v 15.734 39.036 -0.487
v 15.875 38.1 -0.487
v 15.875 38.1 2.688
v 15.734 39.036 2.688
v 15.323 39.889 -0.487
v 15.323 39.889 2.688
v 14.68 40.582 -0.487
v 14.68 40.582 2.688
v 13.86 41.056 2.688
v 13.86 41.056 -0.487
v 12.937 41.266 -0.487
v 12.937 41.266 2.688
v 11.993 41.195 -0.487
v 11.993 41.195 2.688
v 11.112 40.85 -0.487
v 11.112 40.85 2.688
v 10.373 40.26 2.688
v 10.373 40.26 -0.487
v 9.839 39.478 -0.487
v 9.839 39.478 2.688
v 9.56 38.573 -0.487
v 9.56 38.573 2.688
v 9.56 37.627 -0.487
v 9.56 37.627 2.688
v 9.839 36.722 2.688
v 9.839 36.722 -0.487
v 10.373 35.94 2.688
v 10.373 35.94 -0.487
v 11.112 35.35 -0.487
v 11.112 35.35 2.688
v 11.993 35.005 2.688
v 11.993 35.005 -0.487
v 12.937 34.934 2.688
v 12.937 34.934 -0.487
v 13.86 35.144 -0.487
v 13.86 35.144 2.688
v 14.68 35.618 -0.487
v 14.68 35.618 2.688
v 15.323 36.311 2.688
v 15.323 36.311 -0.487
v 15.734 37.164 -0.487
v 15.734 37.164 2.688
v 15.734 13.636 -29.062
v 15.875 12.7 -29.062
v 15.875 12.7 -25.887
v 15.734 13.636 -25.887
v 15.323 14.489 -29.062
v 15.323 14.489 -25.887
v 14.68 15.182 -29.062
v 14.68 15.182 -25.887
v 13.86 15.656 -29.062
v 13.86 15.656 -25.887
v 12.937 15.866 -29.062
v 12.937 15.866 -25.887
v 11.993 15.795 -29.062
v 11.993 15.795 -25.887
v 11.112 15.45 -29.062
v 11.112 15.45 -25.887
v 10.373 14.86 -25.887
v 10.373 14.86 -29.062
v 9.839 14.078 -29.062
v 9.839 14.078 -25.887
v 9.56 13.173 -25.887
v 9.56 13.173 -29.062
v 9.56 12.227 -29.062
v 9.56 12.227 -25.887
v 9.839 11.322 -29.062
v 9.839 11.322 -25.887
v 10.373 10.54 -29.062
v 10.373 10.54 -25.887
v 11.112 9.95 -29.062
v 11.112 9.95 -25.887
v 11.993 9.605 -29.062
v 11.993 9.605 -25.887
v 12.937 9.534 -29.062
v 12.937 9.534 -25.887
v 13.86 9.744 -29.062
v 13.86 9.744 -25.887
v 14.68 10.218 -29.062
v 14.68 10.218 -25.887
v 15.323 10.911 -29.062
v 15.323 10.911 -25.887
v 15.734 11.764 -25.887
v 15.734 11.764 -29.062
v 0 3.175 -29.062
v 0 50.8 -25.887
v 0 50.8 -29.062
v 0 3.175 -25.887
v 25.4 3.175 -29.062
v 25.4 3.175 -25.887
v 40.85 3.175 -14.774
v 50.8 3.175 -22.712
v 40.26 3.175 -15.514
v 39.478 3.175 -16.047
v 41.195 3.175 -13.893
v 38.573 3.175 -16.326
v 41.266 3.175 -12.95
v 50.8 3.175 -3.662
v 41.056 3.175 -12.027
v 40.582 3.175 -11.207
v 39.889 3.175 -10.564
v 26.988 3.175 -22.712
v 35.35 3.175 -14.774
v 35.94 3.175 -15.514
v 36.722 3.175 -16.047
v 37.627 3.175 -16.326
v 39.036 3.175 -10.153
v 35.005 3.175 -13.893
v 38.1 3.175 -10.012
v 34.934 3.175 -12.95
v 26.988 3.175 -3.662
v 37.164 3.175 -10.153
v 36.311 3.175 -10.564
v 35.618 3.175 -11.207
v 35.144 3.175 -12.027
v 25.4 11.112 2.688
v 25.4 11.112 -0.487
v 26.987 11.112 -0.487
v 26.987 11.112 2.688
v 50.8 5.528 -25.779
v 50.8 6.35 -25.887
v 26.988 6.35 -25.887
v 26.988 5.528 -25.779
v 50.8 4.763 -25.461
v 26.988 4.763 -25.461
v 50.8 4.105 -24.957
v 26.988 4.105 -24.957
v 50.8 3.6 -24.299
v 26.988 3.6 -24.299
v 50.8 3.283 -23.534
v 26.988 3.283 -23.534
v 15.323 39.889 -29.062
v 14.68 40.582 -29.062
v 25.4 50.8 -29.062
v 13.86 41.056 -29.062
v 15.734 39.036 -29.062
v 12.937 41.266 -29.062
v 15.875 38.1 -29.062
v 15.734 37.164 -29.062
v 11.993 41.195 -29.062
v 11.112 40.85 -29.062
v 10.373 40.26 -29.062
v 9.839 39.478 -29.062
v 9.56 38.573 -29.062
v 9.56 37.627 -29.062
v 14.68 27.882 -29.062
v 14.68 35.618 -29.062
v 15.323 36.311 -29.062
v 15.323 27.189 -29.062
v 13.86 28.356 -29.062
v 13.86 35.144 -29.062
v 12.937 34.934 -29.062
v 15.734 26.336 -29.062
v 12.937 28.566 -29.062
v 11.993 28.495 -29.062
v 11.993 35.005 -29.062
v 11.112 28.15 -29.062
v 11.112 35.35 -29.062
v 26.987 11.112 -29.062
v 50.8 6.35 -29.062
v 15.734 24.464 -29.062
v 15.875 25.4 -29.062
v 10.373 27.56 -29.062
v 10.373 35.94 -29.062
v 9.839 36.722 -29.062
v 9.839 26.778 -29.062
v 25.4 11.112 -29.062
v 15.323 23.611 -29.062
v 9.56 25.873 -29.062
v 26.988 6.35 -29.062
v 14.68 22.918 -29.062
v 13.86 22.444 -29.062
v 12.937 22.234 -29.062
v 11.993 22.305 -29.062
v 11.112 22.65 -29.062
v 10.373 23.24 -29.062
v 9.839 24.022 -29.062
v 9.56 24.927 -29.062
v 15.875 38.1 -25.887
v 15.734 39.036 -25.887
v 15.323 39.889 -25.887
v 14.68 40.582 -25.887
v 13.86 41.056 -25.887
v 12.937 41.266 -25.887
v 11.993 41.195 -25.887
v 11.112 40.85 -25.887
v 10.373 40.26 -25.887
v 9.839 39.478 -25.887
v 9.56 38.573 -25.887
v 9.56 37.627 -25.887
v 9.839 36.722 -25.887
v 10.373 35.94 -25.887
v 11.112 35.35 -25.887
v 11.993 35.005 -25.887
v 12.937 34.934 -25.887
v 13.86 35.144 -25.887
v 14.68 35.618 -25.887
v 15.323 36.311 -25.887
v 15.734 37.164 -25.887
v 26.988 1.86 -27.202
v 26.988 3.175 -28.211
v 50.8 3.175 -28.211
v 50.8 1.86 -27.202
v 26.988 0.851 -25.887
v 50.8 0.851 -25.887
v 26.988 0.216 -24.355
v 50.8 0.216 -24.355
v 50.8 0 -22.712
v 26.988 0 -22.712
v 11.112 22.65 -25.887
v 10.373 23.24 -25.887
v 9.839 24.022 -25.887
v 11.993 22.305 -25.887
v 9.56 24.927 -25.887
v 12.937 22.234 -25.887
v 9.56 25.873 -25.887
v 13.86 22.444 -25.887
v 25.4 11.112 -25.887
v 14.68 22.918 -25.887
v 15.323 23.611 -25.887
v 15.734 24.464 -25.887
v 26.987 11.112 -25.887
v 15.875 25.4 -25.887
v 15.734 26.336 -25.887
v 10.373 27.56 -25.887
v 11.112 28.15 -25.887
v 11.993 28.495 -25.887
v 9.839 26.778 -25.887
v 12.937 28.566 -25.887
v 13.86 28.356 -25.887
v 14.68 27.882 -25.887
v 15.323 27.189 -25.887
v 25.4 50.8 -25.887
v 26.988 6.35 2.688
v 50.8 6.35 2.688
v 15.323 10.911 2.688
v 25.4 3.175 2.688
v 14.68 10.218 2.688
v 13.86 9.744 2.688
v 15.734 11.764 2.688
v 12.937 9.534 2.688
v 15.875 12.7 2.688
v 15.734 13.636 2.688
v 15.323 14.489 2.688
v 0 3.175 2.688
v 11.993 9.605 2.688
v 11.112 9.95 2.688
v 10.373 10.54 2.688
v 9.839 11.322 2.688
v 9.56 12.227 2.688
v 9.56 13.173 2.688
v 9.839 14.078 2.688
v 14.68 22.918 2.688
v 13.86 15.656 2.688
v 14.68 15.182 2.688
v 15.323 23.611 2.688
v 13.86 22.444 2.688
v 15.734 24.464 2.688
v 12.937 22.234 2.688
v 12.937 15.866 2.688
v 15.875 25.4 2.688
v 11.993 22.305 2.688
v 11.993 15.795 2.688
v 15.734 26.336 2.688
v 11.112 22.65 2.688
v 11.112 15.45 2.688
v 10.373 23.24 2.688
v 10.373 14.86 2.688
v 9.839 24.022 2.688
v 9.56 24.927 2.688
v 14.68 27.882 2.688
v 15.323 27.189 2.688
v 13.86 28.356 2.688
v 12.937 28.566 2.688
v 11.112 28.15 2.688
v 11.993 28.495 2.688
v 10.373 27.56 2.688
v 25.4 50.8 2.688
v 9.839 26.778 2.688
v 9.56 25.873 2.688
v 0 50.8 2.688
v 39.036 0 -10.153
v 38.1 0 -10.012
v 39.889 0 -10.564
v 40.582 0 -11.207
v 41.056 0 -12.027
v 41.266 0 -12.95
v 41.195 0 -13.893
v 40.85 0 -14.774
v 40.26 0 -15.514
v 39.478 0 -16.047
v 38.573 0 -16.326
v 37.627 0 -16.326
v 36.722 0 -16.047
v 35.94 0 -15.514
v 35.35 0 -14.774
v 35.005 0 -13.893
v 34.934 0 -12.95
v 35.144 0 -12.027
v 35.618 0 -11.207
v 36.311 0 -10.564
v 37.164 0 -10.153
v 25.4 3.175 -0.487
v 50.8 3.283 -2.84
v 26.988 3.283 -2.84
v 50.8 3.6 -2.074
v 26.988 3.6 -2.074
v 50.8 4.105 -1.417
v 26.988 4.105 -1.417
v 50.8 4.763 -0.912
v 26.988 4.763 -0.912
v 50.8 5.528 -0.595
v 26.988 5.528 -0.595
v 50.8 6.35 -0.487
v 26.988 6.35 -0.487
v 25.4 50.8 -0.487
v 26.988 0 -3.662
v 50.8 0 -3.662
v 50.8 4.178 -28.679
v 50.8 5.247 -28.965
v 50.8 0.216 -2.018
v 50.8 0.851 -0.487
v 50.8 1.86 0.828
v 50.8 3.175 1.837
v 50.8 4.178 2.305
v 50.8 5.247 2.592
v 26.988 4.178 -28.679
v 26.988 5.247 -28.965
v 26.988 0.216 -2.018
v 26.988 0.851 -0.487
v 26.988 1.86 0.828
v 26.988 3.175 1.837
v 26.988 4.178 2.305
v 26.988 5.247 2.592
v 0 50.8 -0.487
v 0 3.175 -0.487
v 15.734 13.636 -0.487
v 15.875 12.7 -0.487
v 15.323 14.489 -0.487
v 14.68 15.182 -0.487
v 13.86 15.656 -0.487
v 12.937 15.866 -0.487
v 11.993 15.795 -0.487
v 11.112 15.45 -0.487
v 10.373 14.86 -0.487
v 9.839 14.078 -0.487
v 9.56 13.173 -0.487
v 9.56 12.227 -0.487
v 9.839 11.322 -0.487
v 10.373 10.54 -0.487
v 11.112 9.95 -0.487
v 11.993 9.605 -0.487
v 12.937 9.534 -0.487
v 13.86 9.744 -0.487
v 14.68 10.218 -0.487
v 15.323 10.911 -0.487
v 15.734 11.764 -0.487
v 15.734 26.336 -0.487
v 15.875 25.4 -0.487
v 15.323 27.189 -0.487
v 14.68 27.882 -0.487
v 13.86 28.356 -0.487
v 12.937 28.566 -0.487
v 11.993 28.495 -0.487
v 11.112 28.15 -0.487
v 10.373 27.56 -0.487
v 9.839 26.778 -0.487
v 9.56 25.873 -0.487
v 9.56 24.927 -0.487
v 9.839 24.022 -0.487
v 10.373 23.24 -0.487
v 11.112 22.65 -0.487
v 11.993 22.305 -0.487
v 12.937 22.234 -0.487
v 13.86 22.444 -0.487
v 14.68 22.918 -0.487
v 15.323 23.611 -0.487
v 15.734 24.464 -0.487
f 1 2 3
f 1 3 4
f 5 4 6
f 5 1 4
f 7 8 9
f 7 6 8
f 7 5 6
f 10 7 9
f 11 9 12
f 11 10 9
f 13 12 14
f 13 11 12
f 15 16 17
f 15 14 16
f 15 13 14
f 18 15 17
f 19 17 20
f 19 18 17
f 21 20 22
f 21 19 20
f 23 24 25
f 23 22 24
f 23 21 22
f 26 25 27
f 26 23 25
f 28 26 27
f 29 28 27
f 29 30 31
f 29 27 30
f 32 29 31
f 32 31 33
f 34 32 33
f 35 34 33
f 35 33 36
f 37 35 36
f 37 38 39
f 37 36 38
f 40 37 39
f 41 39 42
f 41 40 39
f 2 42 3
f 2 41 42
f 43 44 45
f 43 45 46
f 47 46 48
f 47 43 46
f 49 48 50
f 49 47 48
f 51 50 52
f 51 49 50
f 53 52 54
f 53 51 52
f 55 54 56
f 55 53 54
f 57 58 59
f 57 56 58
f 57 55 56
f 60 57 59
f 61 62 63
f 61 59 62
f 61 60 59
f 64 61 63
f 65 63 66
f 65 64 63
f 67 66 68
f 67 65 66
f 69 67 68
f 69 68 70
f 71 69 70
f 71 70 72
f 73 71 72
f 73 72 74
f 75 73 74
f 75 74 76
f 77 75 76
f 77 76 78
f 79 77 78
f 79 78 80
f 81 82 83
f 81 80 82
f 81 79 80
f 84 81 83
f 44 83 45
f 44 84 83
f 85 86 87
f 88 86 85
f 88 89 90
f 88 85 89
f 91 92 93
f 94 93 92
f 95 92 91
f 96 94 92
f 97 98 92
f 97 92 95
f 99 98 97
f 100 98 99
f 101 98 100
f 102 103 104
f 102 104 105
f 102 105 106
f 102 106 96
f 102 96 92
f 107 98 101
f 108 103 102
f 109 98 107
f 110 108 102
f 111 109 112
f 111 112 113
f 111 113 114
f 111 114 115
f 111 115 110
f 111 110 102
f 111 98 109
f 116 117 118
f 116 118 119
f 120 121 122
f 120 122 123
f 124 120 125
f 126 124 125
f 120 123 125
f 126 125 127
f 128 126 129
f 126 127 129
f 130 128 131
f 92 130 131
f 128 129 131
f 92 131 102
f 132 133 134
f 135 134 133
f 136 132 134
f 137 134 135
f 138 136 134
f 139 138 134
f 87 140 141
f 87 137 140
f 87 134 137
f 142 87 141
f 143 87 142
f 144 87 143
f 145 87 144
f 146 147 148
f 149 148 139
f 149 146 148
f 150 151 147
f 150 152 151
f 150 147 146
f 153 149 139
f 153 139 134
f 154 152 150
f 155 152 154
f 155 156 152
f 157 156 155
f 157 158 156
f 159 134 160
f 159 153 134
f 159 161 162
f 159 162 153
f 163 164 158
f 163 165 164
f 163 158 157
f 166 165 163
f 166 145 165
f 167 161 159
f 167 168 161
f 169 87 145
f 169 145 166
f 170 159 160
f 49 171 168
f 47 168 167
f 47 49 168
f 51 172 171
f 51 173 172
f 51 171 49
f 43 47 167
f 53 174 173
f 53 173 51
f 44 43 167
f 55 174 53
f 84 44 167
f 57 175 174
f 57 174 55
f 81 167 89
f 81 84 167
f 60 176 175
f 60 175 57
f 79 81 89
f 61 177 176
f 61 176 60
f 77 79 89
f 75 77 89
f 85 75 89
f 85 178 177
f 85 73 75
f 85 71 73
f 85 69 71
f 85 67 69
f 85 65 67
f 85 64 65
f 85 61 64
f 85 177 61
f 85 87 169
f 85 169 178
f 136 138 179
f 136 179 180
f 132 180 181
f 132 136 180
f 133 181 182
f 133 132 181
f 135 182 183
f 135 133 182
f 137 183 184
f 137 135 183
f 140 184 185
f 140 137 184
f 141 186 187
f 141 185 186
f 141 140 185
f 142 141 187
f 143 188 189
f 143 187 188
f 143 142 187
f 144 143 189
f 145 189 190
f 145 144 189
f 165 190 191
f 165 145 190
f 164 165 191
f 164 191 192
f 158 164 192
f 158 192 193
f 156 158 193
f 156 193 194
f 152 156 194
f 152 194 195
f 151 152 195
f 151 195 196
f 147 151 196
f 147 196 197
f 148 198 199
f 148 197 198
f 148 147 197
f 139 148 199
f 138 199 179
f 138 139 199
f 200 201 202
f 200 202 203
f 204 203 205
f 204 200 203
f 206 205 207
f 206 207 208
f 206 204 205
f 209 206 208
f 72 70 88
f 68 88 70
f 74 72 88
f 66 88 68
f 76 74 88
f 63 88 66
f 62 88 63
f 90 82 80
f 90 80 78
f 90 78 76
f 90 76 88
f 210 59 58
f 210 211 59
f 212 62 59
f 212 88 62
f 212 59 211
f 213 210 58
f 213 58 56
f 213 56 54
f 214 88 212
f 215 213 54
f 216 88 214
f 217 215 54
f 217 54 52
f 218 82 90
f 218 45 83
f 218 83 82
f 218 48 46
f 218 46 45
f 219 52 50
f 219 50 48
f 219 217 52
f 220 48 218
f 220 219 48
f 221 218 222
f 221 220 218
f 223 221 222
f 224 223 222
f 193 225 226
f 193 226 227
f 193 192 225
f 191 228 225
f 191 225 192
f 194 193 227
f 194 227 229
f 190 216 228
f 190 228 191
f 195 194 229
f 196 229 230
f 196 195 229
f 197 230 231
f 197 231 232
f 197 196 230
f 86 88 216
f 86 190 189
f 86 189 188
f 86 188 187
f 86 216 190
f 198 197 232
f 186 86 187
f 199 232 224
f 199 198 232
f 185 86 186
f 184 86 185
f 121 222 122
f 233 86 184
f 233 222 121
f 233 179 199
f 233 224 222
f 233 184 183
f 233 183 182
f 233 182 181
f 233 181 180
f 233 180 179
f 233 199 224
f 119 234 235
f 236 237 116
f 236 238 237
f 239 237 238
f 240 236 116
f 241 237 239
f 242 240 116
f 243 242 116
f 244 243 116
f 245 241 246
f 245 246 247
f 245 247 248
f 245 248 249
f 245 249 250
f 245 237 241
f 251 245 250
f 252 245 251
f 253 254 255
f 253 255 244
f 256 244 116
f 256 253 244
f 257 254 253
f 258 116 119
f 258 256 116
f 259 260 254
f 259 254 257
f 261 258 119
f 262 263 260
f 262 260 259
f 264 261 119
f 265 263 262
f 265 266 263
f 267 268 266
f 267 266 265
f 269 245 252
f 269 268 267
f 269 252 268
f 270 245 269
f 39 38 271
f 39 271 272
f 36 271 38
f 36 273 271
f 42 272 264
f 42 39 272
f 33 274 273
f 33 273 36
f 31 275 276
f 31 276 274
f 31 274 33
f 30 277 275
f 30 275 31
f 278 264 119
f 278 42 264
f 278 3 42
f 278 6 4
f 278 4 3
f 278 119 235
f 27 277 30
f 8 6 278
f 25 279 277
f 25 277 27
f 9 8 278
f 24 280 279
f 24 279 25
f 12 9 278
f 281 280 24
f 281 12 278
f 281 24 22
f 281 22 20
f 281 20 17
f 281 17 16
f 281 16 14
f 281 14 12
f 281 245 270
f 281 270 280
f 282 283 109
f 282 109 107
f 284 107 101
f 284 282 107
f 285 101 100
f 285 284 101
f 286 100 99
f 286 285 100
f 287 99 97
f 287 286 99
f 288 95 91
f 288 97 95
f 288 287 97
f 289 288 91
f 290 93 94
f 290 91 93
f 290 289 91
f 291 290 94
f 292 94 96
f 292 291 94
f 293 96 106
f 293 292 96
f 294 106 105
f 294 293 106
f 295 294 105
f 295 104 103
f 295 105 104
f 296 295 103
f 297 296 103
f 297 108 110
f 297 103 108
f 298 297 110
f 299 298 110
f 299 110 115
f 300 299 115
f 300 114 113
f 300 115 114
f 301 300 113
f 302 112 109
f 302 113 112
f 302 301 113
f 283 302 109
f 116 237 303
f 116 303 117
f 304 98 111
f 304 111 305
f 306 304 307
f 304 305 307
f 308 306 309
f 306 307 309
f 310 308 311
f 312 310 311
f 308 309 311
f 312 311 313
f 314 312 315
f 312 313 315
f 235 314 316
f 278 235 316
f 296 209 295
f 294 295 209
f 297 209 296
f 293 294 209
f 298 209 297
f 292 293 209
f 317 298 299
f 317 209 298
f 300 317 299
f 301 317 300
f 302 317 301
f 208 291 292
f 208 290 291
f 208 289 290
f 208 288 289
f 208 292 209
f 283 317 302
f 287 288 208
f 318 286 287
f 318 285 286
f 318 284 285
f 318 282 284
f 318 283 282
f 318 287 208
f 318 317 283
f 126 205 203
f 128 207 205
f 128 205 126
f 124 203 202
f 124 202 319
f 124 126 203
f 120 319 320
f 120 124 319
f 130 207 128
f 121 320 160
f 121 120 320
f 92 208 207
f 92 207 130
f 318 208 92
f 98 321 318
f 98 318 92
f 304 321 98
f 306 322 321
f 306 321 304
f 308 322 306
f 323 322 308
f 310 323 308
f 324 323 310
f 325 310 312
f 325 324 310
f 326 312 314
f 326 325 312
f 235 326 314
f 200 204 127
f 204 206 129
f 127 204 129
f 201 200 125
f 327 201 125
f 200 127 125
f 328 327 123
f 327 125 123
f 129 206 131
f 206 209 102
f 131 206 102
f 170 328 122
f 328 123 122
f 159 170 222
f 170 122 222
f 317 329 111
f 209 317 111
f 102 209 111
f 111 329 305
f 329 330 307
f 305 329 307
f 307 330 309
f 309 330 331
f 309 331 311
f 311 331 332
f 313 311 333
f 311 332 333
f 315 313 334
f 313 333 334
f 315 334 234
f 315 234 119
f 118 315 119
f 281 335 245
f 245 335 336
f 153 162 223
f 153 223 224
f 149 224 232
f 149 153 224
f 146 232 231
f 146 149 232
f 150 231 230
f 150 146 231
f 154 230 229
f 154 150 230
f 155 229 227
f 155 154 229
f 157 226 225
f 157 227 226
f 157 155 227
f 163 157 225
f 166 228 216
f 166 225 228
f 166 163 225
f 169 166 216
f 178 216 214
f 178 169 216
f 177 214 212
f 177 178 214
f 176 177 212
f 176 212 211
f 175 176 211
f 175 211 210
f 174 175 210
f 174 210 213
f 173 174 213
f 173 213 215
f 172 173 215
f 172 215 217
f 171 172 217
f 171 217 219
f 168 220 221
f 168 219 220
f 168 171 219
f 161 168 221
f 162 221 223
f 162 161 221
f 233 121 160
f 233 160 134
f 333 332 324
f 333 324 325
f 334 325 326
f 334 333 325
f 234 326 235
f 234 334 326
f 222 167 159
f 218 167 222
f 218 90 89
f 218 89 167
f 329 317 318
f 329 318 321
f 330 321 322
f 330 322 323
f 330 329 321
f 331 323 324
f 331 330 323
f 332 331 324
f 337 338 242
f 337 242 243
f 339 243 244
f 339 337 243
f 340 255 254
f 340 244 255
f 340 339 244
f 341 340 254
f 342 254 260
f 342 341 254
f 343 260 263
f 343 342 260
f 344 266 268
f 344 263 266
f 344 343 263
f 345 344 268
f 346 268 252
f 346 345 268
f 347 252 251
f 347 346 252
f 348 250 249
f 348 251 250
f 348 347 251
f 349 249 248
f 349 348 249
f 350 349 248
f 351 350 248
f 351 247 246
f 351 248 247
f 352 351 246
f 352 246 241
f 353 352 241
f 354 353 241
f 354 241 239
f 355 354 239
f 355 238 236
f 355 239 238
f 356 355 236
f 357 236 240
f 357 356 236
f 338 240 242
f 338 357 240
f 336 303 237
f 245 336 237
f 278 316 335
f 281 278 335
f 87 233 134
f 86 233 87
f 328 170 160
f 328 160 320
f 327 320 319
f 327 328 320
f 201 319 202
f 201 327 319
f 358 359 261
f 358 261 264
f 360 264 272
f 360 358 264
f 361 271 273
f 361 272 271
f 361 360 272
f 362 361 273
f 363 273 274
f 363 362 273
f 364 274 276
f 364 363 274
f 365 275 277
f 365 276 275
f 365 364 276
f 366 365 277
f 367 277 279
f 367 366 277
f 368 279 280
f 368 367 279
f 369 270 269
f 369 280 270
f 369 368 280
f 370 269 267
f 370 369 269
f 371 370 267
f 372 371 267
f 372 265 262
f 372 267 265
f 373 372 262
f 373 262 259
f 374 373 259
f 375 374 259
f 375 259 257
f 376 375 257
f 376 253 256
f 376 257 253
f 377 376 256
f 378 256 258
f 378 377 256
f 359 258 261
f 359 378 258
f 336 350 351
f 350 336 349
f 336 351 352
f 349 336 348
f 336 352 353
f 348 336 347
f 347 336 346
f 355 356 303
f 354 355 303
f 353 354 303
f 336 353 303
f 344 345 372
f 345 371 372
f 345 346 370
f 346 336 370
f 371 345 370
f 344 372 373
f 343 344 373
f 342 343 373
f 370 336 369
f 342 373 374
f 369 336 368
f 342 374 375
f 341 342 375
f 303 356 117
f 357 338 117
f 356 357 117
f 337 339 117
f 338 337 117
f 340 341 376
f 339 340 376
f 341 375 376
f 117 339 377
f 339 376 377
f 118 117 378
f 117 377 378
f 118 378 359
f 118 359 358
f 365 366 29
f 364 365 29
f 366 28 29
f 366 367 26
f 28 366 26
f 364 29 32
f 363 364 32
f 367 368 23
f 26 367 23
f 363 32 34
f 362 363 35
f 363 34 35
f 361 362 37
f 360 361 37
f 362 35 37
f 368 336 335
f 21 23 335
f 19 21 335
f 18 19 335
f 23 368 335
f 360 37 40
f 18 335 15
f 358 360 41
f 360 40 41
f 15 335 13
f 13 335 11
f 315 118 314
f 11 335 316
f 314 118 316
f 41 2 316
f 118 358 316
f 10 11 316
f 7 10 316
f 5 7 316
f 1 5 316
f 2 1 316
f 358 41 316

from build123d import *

# Parameters (mm, degrees)
BOSS_EXTRUDE1_START        = -0.486816485
BOSS_EXTRUDE1_DEPTH        = 3.661816485
SKETCH2_W                  = 23.8125
SKETCH2_H                  = 3.175
BOSS_EXTRUDE2_DEPTH        = 25.4
CUT_EXTRUDE1_DEPTH         = 79.943753108
CUT_EXTRUDE1_DEPTH_BACK    = 79.943753108
SKETCH3_R                  = 3.175
CUT_EXTRUDE2_DEPTH         = 76.643257039
CUT_EXTRUDE2_DEPTH_BACK    = 76.643257039
SKETCH6_R                  = 3.175
CUT_EXTRUDE3_DEPTH         = 79.943753108
CUT_EXTRUDE3_DEPTH_BACK    = 79.943753108
SKETCH7_W                  = 26.9875
SKETCH7_H                  = 3.175
FILLET1_R                  = 3.175
CONVERT_SOLID1_DEPTH       = 50.8
CONVERT_SOLID1_START       = 25.4
CONVERT_SOLID1_2_OUTLINE_W = 7.9375
CONVERT_SOLID1_2_OUTLINE_H = 3.175
CONVERT_SOLID1_2_DEPTH     = 1.5875
CONVERT_SOLID1_START_2     = 26.9875
CONVERT_SOLID1_3_DEPTH     = 23.8125
CONVERT_SOLID1_4_DEPTH     = 23.8125


# Read off the part's stored shape, not the designer's step: Convert-Solid1
with BuildPart() as part:
    # Sketch1 → Boss-Extrude1 (new body)
    with BuildSketch(Plane.XY.offset(BOSS_EXTRUDE1_START)):
        Polygon((50.8, 6.35), (25.4, 50.8), (0, 50.8), (0, 0), (50.8, 0), align=None)
    boss_extrude1 = extrude(amount=BOSS_EXTRUDE1_DEPTH)

    # Sketch2 → Boss-Extrude2 (add)
    with BuildSketch(Plane(origin=(0, 0, -0.486816485), x_dir=(-1, 0, 0), z_dir=(0, 0, -1))):
        with Locations((-38.89375, 1.5875)):
            Rectangle(SKETCH2_W, SKETCH2_H)
    extrude(amount=BOSS_EXTRUDE2_DEPTH)

    # Mirror1: Boss-Extrude1 across plane
    add(boss_extrude1.mirror(Plane(origin=(0, 0, -13.186816485), x_dir=(1, 0, 0), z_dir=(0, 0, -1))))

    # Sketch3 → Cut-Extrude1 (cut, two sides: drawn at the far end of the back side and taken through both)
    with BuildSketch(Plane.XY.offset(3.175).offset(-CUT_EXTRUDE1_DEPTH_BACK)):
        with Locations((12.7, 12.7)):
            Circle(SKETCH3_R)
        with Locations((12.7, 25.4)):
            Circle(SKETCH3_R)
        with Locations((12.7, 38.1)):
            Circle(SKETCH3_R)
    extrude(amount=CUT_EXTRUDE1_DEPTH + CUT_EXTRUDE1_DEPTH_BACK, mode=Mode.SUBTRACT)

    # Sketch6 → Cut-Extrude2 (cut, two sides: drawn at the far end of the back side and taken through both)
    with BuildSketch(Plane(origin=(0, 3.175, 0), x_dir=(1, 0, 0), z_dir=(0, 1, 0)).offset(-CUT_EXTRUDE2_DEPTH_BACK)):
        with Locations(Location((38.1, 13.186816485, 0), (0, 0, 270))):
            Circle(SKETCH6_R)
    extrude(amount=CUT_EXTRUDE2_DEPTH + CUT_EXTRUDE2_DEPTH_BACK, mode=Mode.SUBTRACT)

    # Sketch7 → Cut-Extrude3 (cut, two sides: drawn at the far end of the back side and taken through both)
    with BuildSketch(Plane(origin=(0, 0, -29.54863297), x_dir=(-1, 0, 0), z_dir=(0, 0, -1)).offset(-CUT_EXTRUDE3_DEPTH_BACK)):
        with Locations((-13.49375, 1.5875)):
            Rectangle(SKETCH7_W, SKETCH7_H)
    extrude(amount=CUT_EXTRUDE3_DEPTH + CUT_EXTRUDE3_DEPTH_BACK, mode=Mode.SUBTRACT)

    # Fillet1
    fillet1_edges = [part.edges().sort_by_distance(p)[0] for p in [
        (38.89375, 0, -29.54863297),
        (38.89375, 0, 3.175),
    ]]
    fillet(fillet1_edges, radius=FILLET1_R)

    # Convert-Solid1 outline → Convert-Solid1 (cut)
    with BuildSketch(Plane.YZ):
        with BuildLine():
            Line((50.8, -29.061816485), (3.175, -29.061816485))
            Line((3.175, -29.061816485), (3.175, -28.2110778))
            ThreePointArc((3.175, -28.2110778), (0.850738686, -25.886816486), (0, -22.711816485))
            Line((0, -22.711816485), (0, -26.37363297))
            ThreePointArc((0, -26.37363297), (0.92993597, -28.618697), (3.175, -29.54863297))
            Line((3.175, -29.54863297), (50.8, -29.54863297))
            Line((50.8, -29.54863297), (50.8, -29.061816485))
        make_face()
        with BuildLine():
            Line((0, 0), (0, -3.661816485))
            ThreePointArc((0, -3.661816485), (0.850738686, -0.486816484), (3.175, 1.83744483))
            Line((3.175, 1.83744483), (3.175, 2.688183515))
            Line((3.175, 2.688183515), (50.8, 2.688183515))
            Line((50.8, 2.688183515), (50.8, 3.175))
            Line((50.8, 3.175), (3.175, 3.175))
            ThreePointArc((3.175, 3.175), (0.92993597, 2.24506403), (0, 0))
        make_face()
    extrude(amount=CONVERT_SOLID1_DEPTH, mode=Mode.SUBTRACT)

    # Convert-Solid1 2 outline → Convert-Solid1 2 (cut)
    with BuildSketch(Plane.YZ.offset(CONVERT_SOLID1_START)):
        with Locations((7.14375, -27.474316485)):
            Rectangle(CONVERT_SOLID1_2_OUTLINE_W, CONVERT_SOLID1_2_OUTLINE_H)
        with Locations((7.14375, 1.100683515)):
            Rectangle(CONVERT_SOLID1_2_OUTLINE_W, CONVERT_SOLID1_2_OUTLINE_H)
    extrude(amount=CONVERT_SOLID1_2_DEPTH, mode=Mode.SUBTRACT)

    # Convert-Solid1 3 outline → Convert-Solid1 3 (cut)
    with BuildSketch(Plane.YZ.offset(CONVERT_SOLID1_START_2)):
        with BuildLine():
            Line((3.175, -29.061816485), (6.35, -29.061816485))
            ThreePointArc((6.35, -29.061816485), (4.706499064, -28.845445482), (3.175, -28.2110778))
            Line((3.175, -28.2110778), (3.175, -29.061816485))
        make_face()
        with BuildLine():
            Line((3.175, 2.688183515), (3.175, 1.83744483))
            ThreePointArc((3.175, 1.83744483), (4.706499064, 2.471812512), (6.35, 2.688183515))
            Line((6.35, 2.688183515), (3.175, 2.688183515))
        make_face()
    extrude(amount=CONVERT_SOLID1_3_DEPTH, mode=Mode.SUBTRACT)

    # Convert-Solid1 4 outline → Convert-Solid1 4 (add)
    with BuildSketch(Plane.YZ.offset(CONVERT_SOLID1_START_2)):
        with BuildLine():
            Line((3.175, -25.886816485), (6.35, -25.886816485))
            ThreePointArc((6.35, -25.886816485), (4.10493597, -24.956880515), (3.175, -22.711816485))
            Line((3.175, -22.711816485), (3.175, -25.886816485))
        make_face()
        with BuildLine():
            Line((3.175, -0.486816485), (3.175, -3.661816485))
            ThreePointArc((3.175, -3.661816485), (4.10493597, -1.416752455), (6.35, -0.486816485))
            Line((6.35, -0.486816485), (3.175, -0.486816485))
        make_face()
    extrude(amount=CONVERT_SOLID1_4_DEPTH)


solid = part.part
